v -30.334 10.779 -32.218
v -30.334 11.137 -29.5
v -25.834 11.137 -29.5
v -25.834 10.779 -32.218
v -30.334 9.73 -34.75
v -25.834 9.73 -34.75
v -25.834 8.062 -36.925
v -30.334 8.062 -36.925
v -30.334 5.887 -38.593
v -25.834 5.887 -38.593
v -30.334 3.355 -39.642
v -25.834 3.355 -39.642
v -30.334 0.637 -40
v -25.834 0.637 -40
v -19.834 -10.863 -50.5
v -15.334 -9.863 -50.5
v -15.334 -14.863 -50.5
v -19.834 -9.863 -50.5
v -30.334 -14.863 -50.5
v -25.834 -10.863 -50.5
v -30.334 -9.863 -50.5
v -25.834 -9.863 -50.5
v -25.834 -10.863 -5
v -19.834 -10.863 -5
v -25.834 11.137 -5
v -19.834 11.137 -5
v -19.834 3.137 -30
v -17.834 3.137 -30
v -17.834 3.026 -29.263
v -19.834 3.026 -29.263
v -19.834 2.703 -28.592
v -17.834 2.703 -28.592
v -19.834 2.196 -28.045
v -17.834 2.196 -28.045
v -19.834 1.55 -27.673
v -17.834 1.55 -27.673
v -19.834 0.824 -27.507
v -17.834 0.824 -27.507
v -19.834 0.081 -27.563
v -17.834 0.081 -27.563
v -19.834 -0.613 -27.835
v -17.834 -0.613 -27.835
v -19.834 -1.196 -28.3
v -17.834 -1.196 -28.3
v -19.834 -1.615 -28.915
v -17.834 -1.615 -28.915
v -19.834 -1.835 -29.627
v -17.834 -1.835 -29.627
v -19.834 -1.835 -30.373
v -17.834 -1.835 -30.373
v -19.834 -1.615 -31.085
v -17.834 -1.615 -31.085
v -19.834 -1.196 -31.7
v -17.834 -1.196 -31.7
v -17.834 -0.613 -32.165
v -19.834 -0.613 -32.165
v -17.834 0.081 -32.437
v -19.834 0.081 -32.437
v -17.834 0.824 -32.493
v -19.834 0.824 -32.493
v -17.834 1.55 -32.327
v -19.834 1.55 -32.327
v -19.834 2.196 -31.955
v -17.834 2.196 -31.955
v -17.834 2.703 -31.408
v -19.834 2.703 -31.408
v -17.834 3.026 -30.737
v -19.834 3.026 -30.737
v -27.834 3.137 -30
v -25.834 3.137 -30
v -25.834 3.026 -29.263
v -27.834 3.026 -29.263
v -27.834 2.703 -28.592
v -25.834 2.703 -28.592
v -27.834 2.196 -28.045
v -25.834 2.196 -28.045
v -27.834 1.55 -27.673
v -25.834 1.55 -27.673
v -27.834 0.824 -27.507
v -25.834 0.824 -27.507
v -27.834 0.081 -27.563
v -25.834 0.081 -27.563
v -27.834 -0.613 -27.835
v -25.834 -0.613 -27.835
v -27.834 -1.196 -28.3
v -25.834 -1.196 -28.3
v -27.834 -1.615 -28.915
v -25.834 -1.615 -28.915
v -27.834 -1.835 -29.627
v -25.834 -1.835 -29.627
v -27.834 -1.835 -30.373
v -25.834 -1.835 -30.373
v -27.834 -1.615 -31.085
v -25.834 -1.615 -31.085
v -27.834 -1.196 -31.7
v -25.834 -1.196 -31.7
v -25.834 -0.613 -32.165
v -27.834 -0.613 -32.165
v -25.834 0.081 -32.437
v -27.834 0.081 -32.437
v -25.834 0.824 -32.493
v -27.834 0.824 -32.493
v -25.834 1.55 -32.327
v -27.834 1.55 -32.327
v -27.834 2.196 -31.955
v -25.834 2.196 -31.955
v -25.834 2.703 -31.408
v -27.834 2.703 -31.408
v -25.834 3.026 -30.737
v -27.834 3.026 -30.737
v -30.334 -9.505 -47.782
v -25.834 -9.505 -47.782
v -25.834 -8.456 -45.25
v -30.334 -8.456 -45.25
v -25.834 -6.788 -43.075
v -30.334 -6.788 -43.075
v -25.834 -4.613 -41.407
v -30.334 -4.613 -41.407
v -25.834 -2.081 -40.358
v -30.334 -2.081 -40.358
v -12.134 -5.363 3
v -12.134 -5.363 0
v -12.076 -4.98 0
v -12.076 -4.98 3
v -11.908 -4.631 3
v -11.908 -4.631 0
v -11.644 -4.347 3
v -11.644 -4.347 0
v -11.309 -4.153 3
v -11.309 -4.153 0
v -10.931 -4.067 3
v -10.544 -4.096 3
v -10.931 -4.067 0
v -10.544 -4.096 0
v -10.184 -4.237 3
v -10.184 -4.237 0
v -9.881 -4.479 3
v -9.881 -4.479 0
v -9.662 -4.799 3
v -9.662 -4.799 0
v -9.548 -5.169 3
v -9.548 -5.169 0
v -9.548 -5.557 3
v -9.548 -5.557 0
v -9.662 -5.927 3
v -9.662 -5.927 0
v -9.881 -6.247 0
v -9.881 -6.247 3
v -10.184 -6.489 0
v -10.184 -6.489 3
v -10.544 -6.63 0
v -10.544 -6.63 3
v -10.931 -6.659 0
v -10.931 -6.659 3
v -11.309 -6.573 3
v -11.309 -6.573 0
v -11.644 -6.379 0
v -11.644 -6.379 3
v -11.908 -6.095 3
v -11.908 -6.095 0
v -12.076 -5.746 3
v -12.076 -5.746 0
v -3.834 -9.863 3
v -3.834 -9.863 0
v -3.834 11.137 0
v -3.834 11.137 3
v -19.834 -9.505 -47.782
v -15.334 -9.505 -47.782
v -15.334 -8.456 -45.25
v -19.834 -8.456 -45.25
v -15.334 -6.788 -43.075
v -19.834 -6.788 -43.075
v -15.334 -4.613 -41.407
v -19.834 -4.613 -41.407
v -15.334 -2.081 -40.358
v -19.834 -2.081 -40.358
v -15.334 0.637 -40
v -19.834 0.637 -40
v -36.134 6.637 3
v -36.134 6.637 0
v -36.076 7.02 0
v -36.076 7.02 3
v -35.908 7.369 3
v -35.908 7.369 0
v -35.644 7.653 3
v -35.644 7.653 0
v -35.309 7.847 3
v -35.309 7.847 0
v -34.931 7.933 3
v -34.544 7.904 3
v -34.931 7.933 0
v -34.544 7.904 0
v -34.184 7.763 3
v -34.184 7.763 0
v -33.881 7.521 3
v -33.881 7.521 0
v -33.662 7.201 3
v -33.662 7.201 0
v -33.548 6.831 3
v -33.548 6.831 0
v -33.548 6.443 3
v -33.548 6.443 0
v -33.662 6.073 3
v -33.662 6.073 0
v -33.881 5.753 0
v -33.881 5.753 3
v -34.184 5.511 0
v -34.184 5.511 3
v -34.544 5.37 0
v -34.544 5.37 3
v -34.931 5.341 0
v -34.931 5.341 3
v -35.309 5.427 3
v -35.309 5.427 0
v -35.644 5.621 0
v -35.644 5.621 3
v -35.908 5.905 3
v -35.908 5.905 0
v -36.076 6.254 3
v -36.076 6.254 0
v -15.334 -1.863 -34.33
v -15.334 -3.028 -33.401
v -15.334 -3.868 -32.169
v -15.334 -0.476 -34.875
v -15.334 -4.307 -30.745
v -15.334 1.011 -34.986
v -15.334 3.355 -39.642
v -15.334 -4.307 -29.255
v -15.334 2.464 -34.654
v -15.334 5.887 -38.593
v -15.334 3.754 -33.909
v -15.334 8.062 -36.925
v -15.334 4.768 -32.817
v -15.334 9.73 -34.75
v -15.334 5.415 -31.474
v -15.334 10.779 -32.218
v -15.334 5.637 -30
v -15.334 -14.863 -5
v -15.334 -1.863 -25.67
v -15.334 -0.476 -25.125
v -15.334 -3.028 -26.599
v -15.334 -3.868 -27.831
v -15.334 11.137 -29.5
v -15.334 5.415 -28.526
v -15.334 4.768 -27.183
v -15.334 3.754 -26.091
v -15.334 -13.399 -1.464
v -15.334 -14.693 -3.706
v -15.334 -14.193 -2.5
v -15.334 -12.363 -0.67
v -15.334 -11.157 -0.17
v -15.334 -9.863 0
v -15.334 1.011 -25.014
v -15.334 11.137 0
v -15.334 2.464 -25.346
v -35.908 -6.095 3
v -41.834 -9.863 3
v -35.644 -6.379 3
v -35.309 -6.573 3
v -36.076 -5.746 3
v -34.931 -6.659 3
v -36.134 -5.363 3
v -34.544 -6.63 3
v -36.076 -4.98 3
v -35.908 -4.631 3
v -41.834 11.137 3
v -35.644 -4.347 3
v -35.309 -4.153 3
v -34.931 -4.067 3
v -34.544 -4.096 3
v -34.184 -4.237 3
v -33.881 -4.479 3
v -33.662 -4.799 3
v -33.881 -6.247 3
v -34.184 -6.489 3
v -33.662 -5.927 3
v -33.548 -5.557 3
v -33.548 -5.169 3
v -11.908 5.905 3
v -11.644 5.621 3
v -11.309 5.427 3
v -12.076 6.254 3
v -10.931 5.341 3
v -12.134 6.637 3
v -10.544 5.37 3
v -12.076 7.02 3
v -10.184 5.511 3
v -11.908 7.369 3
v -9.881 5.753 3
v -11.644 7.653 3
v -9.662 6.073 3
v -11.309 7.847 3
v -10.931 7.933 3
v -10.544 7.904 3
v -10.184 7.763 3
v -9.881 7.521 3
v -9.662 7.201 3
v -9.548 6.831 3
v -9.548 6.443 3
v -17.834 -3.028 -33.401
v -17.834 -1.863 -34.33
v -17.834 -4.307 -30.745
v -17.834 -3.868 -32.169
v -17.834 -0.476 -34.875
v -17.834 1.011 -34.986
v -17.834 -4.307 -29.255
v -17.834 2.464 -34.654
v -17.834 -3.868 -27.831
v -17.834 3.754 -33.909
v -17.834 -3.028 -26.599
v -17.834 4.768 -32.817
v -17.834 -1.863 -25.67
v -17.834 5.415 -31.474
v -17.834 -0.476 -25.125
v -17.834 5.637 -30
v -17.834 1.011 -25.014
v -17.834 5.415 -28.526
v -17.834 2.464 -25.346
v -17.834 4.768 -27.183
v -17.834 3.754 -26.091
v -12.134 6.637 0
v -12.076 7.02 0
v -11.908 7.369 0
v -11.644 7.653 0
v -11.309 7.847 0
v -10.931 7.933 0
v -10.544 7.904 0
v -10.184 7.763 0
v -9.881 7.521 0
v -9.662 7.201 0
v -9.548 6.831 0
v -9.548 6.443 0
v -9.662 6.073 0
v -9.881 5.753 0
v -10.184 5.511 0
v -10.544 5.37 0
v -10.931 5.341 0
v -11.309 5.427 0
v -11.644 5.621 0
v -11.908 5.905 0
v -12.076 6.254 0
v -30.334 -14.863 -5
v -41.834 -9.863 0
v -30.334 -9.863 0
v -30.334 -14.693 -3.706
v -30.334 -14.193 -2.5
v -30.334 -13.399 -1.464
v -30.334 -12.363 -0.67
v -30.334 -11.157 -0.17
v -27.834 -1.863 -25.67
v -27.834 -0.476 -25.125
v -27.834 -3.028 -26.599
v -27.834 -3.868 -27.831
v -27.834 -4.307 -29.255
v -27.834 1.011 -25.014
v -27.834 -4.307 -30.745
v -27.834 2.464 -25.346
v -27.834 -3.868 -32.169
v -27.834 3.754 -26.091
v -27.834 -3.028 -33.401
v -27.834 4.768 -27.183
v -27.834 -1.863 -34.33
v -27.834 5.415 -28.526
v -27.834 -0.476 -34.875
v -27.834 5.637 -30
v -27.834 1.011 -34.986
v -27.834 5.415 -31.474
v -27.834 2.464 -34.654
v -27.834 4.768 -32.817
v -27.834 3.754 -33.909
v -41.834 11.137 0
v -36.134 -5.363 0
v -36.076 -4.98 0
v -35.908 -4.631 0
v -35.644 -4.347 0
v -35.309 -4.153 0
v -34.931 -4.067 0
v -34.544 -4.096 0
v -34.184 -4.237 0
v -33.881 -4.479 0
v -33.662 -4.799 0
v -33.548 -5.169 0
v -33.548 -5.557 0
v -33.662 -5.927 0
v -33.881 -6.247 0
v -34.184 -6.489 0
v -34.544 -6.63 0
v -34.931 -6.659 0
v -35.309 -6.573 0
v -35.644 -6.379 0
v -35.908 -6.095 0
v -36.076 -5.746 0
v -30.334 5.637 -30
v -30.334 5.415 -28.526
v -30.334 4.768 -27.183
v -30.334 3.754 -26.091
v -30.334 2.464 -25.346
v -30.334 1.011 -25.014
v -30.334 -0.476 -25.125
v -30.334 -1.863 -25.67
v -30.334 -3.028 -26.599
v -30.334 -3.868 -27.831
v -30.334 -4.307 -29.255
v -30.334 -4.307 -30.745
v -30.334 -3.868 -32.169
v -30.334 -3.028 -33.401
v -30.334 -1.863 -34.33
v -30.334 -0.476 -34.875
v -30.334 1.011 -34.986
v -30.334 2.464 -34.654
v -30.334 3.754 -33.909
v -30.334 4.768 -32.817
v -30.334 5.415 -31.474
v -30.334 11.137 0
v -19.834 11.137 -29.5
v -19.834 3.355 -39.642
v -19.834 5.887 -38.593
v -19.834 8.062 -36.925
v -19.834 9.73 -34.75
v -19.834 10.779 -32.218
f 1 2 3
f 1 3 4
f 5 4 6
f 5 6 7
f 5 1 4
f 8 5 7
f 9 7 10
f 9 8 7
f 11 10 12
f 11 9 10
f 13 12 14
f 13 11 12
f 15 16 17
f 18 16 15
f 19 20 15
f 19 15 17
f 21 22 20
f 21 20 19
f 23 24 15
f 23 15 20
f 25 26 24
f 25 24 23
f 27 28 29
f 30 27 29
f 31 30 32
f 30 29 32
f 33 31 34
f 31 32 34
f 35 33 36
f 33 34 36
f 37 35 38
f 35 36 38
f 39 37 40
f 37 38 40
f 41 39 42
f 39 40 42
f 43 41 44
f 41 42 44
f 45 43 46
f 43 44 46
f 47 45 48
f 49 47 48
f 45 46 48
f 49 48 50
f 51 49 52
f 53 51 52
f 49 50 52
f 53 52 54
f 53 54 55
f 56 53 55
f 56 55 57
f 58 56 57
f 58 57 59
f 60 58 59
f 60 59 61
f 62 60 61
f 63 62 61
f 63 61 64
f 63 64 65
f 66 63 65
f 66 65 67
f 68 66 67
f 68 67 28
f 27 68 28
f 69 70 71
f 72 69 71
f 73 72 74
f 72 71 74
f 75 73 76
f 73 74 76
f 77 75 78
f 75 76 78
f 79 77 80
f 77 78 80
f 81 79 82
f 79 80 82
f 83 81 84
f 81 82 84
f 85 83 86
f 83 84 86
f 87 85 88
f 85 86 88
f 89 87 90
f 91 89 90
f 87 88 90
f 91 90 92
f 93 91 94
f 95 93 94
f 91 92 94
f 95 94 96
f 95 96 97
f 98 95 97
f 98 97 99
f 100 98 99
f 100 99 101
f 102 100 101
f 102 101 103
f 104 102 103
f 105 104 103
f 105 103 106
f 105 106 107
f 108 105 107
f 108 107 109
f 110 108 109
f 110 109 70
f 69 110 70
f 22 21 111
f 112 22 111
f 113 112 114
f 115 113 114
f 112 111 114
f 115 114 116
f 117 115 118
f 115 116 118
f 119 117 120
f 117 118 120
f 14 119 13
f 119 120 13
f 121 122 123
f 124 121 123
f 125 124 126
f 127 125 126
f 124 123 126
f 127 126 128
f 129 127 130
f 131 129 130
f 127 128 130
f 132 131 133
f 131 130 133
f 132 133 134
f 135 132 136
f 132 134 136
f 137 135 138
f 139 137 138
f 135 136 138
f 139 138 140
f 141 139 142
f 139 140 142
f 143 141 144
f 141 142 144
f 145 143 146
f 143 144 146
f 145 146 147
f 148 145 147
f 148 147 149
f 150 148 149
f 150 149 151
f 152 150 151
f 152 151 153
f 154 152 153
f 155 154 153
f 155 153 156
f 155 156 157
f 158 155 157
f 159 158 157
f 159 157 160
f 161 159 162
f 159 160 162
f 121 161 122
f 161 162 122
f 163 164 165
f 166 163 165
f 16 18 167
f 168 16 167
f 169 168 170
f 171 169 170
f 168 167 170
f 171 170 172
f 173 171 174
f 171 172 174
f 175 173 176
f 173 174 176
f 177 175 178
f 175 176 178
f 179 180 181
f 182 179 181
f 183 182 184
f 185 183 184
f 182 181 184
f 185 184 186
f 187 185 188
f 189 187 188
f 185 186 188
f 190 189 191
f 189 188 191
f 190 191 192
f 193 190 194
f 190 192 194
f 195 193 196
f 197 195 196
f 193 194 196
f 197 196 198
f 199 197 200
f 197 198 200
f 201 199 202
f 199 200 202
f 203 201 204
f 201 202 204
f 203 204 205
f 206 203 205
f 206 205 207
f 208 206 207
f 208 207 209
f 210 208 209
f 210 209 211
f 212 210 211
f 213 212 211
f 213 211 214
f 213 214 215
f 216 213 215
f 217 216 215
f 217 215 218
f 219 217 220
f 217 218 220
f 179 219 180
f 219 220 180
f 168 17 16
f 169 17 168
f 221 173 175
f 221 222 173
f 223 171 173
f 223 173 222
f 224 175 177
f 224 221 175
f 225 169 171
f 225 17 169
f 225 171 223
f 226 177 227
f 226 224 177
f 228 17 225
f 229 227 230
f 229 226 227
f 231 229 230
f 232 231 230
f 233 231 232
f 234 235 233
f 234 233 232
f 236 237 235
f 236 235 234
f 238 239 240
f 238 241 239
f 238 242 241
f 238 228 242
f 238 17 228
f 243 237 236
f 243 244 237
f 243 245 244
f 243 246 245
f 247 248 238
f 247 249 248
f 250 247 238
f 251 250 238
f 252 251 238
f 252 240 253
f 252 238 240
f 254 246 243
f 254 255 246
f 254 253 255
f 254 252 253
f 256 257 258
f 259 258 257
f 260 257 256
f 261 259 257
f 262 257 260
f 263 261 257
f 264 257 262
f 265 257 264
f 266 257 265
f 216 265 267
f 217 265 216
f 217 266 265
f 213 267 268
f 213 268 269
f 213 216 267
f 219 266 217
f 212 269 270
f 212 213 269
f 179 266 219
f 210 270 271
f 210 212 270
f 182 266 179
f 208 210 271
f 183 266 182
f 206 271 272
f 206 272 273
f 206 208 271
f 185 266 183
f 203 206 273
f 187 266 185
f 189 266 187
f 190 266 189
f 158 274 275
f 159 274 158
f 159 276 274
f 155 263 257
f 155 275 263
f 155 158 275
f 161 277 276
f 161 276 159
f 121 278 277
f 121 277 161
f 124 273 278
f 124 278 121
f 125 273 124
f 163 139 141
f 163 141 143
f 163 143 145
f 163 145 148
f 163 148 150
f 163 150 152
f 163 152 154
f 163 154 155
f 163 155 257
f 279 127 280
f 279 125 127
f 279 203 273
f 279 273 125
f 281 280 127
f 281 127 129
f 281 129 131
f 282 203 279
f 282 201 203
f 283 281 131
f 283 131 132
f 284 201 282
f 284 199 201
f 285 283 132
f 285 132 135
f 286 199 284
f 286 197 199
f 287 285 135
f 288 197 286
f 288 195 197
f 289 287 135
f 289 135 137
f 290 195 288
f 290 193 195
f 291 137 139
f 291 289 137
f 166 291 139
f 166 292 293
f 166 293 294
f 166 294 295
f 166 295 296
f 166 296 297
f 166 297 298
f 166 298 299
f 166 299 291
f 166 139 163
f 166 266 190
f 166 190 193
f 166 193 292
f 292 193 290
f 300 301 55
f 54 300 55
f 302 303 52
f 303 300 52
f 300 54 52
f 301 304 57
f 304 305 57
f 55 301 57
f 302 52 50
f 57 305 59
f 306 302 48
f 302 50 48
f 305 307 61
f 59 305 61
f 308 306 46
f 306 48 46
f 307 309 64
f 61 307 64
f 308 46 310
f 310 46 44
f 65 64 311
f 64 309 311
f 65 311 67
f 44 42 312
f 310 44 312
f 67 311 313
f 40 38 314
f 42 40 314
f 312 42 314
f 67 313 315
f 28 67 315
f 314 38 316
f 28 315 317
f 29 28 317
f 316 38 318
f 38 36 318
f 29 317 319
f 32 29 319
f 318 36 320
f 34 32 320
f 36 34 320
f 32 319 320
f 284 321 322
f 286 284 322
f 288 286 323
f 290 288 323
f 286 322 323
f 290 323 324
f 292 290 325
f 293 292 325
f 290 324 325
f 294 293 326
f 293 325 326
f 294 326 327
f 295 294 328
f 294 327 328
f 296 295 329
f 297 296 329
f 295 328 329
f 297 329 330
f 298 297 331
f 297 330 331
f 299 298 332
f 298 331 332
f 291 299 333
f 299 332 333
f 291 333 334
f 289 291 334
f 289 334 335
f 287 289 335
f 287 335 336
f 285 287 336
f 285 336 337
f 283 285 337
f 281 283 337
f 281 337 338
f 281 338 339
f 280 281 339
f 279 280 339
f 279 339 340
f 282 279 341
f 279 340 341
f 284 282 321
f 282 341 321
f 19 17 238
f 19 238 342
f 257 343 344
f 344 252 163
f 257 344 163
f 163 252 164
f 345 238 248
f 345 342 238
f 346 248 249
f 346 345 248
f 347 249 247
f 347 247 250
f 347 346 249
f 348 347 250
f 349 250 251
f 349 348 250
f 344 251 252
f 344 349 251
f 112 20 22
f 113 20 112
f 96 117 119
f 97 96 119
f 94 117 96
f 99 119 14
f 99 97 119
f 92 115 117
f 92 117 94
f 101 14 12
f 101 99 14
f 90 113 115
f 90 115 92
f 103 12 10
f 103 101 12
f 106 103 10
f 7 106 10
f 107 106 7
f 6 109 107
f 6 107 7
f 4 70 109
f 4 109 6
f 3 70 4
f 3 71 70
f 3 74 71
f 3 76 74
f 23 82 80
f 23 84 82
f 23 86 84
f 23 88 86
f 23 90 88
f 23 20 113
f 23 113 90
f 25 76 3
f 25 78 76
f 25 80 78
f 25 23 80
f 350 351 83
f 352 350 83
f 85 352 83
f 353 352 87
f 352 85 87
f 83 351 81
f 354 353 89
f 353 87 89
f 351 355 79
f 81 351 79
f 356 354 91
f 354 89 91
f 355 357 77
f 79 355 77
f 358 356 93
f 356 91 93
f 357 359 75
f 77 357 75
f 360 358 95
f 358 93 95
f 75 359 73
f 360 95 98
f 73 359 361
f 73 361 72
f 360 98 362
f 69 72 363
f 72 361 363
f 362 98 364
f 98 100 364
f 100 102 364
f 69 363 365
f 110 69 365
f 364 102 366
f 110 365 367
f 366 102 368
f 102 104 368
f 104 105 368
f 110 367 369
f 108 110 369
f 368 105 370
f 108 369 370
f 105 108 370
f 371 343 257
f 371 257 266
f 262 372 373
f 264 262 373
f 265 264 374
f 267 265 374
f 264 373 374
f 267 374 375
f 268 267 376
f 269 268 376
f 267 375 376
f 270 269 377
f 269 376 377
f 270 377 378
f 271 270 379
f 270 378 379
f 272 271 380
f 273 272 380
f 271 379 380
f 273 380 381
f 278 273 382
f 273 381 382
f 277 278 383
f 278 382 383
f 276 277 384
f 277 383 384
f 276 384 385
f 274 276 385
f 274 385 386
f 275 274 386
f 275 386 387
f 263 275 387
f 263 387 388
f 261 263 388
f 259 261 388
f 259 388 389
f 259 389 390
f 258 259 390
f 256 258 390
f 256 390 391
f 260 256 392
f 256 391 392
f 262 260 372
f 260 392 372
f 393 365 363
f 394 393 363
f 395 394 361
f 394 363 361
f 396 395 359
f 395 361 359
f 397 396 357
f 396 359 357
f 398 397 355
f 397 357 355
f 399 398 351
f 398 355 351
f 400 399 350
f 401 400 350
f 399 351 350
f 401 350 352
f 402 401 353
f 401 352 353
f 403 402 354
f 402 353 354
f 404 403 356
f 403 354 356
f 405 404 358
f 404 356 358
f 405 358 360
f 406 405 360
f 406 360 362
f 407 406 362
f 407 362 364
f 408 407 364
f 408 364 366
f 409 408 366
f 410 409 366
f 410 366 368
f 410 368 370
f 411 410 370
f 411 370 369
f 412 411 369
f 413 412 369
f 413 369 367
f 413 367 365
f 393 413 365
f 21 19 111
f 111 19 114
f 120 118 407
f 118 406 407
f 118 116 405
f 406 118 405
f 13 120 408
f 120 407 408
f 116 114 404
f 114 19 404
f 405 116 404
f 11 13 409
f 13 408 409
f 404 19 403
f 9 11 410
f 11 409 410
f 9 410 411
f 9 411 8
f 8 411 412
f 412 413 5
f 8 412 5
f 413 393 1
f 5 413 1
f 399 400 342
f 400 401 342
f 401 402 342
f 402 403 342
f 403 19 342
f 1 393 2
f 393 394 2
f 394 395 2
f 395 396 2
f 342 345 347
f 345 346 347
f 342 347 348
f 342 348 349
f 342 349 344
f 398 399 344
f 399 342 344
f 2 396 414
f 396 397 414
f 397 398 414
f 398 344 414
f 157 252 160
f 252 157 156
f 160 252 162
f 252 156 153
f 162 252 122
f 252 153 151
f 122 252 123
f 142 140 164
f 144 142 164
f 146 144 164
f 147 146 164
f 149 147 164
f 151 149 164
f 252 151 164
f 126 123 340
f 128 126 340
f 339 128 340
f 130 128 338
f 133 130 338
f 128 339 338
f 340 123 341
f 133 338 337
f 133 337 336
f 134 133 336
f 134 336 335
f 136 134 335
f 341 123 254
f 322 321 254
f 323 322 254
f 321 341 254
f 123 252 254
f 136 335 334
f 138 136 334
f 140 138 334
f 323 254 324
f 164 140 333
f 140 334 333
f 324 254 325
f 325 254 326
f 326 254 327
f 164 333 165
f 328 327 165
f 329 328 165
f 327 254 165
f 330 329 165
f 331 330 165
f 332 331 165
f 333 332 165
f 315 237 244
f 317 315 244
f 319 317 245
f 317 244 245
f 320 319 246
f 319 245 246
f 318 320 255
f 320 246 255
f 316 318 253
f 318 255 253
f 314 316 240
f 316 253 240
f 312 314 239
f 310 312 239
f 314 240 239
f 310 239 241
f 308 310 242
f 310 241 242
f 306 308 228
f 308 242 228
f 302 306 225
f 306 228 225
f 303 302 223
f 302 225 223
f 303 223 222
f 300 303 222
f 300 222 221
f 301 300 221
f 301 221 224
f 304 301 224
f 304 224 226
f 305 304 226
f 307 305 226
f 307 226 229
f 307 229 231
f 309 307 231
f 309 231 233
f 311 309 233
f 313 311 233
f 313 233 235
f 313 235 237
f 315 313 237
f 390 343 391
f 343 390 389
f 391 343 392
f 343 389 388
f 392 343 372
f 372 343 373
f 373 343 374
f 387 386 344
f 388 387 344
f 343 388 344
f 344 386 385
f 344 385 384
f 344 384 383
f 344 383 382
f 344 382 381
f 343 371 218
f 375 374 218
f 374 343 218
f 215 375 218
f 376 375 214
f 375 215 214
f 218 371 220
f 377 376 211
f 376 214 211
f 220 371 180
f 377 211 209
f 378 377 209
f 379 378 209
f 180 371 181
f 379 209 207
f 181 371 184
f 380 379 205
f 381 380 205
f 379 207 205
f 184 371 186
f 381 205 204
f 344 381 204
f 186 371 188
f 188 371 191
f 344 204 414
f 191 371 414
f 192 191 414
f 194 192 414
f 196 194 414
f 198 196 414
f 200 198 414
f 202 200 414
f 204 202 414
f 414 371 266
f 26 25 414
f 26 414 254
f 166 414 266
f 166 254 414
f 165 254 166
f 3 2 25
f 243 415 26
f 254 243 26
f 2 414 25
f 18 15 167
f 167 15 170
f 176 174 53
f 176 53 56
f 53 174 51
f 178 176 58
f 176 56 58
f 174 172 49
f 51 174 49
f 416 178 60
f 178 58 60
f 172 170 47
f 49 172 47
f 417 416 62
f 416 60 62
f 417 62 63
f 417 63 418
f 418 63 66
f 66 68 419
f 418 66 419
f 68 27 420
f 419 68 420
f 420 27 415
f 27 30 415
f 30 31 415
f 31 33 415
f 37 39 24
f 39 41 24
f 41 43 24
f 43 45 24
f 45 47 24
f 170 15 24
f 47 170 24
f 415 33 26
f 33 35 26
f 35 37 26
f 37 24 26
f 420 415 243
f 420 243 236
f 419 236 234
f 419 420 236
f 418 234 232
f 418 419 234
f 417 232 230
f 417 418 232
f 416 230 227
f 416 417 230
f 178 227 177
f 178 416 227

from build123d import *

# Parameters (mm, degrees)
SKETCH_1_W             = 38
SKETCH_1_H             = 21
EXTRUDE_1_DEPTH        = 3
SKETCH_2_R             = 1.3
CUT_EXTRUDE_1_DEPTH    = 3
PATTERN_LINEAR_1_COUNT = 2
PATTERN_LINEAR_1_PITCH = 24
SKETCH_9_W             = 15
SKETCH_9_H             = 21
EXTRUDE_5_DEPTH        = 40
SKETCH_10_R            = 5
CUT_EXTRUDE_5_DEPTH    = 60
SKETCH_11_W            = 6
SKETCH_11_H            = 21
CUT_EXTRUDE_6_DEPTH    = 35
SKETCH_12_R            = 6
EXTRUDE_6_DEPTH        = 2
SKETCH_14_R            = 6
EXTRUDE_8_DEPTH        = 2
SKETCH_15_R            = 2.5
CUT_EXTRUDE_7_DEPTH    = 20
SKETCH_16_W            = 15
SKETCH_16_H            = 50.5
EXTRUDE_9_DEPTH        = 5
FILLET_START           = -41.833744856
FILLET_2_DEPTH         = 38
FILLET_START_2         = -30.333744856
FILLET_2_2_DEPTH       = 4.5
FILLET_START_3         = -19.833744856
FILLET_2_3_DEPTH       = 4.5
FILLET_3_R             = 5
SKETCH_17_W            = 6
SKETCH_17_H            = 22
CUT_EXTRUDE_8_DEPTH    = 100


with BuildPart() as part:
    # 草图1 → 凸台-拉伸1 (new body)
    with BuildSketch(Plane.XY):
        with Locations((-22.833744856, 0.637037037)):
            Rectangle(SKETCH_1_W, SKETCH_1_H)
    extrude(amount=EXTRUDE_1_DEPTH)

    # 草图2 → 切除-拉伸1 (cut)
    with BuildSketch(Plane(origin=(0, 0, 0), x_dir=(-1, 0, 0), z_dir=(0, 0, -1))):
        with Locations((10.833744856, 6.637037037)):
            Circle(SKETCH_2_R)
        with Locations((10.833744856, -5.362962963)):
            Circle(SKETCH_2_R)
    cut_extrude_1 = extrude(amount=-CUT_EXTRUDE_1_DEPTH, mode=Mode.SUBTRACT)

    # 阵列(线性)1: 切除-拉伸1 ×2
    with Locations(*[(-i * PATTERN_LINEAR_1_PITCH, 0, 0) for i in range(1, PATTERN_LINEAR_1_COUNT)]):
        add(cut_extrude_1, mode=Mode.SUBTRACT)

    # 草图9 → 凸台-拉伸5 (add)
    with BuildSketch(Plane(origin=(0, 0, 0), x_dir=(-1, 0, 0), z_dir=(0, 0, -1))):
        with Locations((22.833744856, 0.637037037)):
            Rectangle(SKETCH_9_W, SKETCH_9_H)
    extrude(amount=EXTRUDE_5_DEPTH)

    # 草图10 → 切除-拉伸5 (cut)
    with BuildSketch(Plane(origin=(-15.333744856, 0, 0), x_dir=(0, 0, -1), z_dir=(1, 0, 0))):
        with Locations(Location((30, 0.637037037, 0), (0, 0, 90))):
            Circle(SKETCH_10_R)
    extrude(amount=-CUT_EXTRUDE_5_DEPTH, mode=Mode.SUBTRACT)

    # 草图11 → 切除-拉伸6 (cut)
    with BuildSketch(Plane(origin=(0, 0, -40), x_dir=(-1, 0, 0), z_dir=(0, 0, -1))):
        with Locations((22.833744856, 0.637037037)):
            Rectangle(SKETCH_11_W, SKETCH_11_H)
    extrude(amount=-CUT_EXTRUDE_6_DEPTH, mode=Mode.SUBTRACT)

    # 草图12 → 凸台-拉伸6 (add)
    with BuildSketch(Plane.ZY.offset(19.833744856)):
        with Locations((-30, 0.637037037)):
            Circle(SKETCH_12_R)
    extrude(amount=-EXTRUDE_6_DEPTH)

    # 草图14 → 凸台-拉伸8 (add)
    with BuildSketch(Plane(origin=(-25.833744856, 0, 0), x_dir=(0, 0, -1), z_dir=(1, 0, 0))):
        with Locations((30, 0.637037037)):
            Circle(SKETCH_14_R)
    extrude(amount=-EXTRUDE_8_DEPTH)

    # 草图15 → 切除-拉伸7 (cut)
    with BuildSketch(Plane(origin=(-17.833744856, 0, 0), x_dir=(0, 0, -1), z_dir=(1, 0, 0))):
        with Locations(Location((30, 0.637037037, 0), (0, 0, 90))):
            Circle(SKETCH_15_R)
    extrude(amount=-CUT_EXTRUDE_7_DEPTH, mode=Mode.SUBTRACT)

    # 草图16 → 凸台-拉伸9 (add)
    with BuildSketch(Plane(origin=(0, -9.862962963, 0), x_dir=(-1, 0, 0), z_dir=(0, -1, 0))):
        with Locations((22.833744856, 25.25)):
            Rectangle(SKETCH_16_W, SKETCH_16_H)
    extrude(amount=EXTRUDE_9_DEPTH)

    # 圆角2: read off the stored shape, not the designer's step
    # 圆角2 outline → 圆角2 (cut)
    with BuildSketch(Plane.YZ.offset(FILLET_START)):
        with BuildLine():
            Line((11.137037037, -40), (11.137037037, -29.5))
            ThreePointArc((11.137037037, -29.5), (8.061658239, -36.924621202), (0.637037037, -40))
            Line((0.637037037, -40), (11.137037037, -40))
        make_face()
    extrude(amount=FILLET_2_DEPTH, mode=Mode.SUBTRACT)

    # Fillet 2 2 outline → Fillet 2 2 (add)
    with BuildSketch(Plane.YZ.offset(FILLET_START_2)):
        with BuildLine():
            ThreePointArc((-9.862962963, -50.5), (-6.787584165, -43.075378798), (0.637037037, -40))
            Line((0.637037037, -40), (-9.862962963, -40))
            Line((-9.862962963, -40), (-9.862962963, -50.5))
        make_face()
    extrude(amount=FILLET_2_2_DEPTH)

    # Fillet 2 3 outline → Fillet 2 3 (add)
    with BuildSketch(Plane.YZ.offset(FILLET_START_3)):
        with BuildLine():
            ThreePointArc((-9.862962963, -50.5), (-6.787584165, -43.075378798), (0.637037037, -40))
            Line((0.637037037, -40), (-9.862962963, -40))
            Line((-9.862962963, -40), (-9.862962963, -50.5))
        make_face()
    extrude(amount=FILLET_2_3_DEPTH)

    # 圆角3
    fillet_3_edges = [part.edges().sort_by_distance(p)[0] for p in [
        (-22.833744856, -14.862962963, 0),
    ]]
    fillet(fillet_3_edges, radius=FILLET_3_R - 0.0001)  # a hair under: the kernel refuses the full size

    # 草图17 → 切除-拉伸8 (cut)
    with BuildSketch(Plane(origin=(0, 0, -5), x_dir=(-1, 0, 0), z_dir=(0, 0, -1))):
        with Locations((22.833744856, 0.137037037)):
            Rectangle(SKETCH_17_W, SKETCH_17_H)
    extrude(amount=CUT_EXTRUDE_8_DEPTH, mode=Mode.SUBTRACT)


solid = part.part
